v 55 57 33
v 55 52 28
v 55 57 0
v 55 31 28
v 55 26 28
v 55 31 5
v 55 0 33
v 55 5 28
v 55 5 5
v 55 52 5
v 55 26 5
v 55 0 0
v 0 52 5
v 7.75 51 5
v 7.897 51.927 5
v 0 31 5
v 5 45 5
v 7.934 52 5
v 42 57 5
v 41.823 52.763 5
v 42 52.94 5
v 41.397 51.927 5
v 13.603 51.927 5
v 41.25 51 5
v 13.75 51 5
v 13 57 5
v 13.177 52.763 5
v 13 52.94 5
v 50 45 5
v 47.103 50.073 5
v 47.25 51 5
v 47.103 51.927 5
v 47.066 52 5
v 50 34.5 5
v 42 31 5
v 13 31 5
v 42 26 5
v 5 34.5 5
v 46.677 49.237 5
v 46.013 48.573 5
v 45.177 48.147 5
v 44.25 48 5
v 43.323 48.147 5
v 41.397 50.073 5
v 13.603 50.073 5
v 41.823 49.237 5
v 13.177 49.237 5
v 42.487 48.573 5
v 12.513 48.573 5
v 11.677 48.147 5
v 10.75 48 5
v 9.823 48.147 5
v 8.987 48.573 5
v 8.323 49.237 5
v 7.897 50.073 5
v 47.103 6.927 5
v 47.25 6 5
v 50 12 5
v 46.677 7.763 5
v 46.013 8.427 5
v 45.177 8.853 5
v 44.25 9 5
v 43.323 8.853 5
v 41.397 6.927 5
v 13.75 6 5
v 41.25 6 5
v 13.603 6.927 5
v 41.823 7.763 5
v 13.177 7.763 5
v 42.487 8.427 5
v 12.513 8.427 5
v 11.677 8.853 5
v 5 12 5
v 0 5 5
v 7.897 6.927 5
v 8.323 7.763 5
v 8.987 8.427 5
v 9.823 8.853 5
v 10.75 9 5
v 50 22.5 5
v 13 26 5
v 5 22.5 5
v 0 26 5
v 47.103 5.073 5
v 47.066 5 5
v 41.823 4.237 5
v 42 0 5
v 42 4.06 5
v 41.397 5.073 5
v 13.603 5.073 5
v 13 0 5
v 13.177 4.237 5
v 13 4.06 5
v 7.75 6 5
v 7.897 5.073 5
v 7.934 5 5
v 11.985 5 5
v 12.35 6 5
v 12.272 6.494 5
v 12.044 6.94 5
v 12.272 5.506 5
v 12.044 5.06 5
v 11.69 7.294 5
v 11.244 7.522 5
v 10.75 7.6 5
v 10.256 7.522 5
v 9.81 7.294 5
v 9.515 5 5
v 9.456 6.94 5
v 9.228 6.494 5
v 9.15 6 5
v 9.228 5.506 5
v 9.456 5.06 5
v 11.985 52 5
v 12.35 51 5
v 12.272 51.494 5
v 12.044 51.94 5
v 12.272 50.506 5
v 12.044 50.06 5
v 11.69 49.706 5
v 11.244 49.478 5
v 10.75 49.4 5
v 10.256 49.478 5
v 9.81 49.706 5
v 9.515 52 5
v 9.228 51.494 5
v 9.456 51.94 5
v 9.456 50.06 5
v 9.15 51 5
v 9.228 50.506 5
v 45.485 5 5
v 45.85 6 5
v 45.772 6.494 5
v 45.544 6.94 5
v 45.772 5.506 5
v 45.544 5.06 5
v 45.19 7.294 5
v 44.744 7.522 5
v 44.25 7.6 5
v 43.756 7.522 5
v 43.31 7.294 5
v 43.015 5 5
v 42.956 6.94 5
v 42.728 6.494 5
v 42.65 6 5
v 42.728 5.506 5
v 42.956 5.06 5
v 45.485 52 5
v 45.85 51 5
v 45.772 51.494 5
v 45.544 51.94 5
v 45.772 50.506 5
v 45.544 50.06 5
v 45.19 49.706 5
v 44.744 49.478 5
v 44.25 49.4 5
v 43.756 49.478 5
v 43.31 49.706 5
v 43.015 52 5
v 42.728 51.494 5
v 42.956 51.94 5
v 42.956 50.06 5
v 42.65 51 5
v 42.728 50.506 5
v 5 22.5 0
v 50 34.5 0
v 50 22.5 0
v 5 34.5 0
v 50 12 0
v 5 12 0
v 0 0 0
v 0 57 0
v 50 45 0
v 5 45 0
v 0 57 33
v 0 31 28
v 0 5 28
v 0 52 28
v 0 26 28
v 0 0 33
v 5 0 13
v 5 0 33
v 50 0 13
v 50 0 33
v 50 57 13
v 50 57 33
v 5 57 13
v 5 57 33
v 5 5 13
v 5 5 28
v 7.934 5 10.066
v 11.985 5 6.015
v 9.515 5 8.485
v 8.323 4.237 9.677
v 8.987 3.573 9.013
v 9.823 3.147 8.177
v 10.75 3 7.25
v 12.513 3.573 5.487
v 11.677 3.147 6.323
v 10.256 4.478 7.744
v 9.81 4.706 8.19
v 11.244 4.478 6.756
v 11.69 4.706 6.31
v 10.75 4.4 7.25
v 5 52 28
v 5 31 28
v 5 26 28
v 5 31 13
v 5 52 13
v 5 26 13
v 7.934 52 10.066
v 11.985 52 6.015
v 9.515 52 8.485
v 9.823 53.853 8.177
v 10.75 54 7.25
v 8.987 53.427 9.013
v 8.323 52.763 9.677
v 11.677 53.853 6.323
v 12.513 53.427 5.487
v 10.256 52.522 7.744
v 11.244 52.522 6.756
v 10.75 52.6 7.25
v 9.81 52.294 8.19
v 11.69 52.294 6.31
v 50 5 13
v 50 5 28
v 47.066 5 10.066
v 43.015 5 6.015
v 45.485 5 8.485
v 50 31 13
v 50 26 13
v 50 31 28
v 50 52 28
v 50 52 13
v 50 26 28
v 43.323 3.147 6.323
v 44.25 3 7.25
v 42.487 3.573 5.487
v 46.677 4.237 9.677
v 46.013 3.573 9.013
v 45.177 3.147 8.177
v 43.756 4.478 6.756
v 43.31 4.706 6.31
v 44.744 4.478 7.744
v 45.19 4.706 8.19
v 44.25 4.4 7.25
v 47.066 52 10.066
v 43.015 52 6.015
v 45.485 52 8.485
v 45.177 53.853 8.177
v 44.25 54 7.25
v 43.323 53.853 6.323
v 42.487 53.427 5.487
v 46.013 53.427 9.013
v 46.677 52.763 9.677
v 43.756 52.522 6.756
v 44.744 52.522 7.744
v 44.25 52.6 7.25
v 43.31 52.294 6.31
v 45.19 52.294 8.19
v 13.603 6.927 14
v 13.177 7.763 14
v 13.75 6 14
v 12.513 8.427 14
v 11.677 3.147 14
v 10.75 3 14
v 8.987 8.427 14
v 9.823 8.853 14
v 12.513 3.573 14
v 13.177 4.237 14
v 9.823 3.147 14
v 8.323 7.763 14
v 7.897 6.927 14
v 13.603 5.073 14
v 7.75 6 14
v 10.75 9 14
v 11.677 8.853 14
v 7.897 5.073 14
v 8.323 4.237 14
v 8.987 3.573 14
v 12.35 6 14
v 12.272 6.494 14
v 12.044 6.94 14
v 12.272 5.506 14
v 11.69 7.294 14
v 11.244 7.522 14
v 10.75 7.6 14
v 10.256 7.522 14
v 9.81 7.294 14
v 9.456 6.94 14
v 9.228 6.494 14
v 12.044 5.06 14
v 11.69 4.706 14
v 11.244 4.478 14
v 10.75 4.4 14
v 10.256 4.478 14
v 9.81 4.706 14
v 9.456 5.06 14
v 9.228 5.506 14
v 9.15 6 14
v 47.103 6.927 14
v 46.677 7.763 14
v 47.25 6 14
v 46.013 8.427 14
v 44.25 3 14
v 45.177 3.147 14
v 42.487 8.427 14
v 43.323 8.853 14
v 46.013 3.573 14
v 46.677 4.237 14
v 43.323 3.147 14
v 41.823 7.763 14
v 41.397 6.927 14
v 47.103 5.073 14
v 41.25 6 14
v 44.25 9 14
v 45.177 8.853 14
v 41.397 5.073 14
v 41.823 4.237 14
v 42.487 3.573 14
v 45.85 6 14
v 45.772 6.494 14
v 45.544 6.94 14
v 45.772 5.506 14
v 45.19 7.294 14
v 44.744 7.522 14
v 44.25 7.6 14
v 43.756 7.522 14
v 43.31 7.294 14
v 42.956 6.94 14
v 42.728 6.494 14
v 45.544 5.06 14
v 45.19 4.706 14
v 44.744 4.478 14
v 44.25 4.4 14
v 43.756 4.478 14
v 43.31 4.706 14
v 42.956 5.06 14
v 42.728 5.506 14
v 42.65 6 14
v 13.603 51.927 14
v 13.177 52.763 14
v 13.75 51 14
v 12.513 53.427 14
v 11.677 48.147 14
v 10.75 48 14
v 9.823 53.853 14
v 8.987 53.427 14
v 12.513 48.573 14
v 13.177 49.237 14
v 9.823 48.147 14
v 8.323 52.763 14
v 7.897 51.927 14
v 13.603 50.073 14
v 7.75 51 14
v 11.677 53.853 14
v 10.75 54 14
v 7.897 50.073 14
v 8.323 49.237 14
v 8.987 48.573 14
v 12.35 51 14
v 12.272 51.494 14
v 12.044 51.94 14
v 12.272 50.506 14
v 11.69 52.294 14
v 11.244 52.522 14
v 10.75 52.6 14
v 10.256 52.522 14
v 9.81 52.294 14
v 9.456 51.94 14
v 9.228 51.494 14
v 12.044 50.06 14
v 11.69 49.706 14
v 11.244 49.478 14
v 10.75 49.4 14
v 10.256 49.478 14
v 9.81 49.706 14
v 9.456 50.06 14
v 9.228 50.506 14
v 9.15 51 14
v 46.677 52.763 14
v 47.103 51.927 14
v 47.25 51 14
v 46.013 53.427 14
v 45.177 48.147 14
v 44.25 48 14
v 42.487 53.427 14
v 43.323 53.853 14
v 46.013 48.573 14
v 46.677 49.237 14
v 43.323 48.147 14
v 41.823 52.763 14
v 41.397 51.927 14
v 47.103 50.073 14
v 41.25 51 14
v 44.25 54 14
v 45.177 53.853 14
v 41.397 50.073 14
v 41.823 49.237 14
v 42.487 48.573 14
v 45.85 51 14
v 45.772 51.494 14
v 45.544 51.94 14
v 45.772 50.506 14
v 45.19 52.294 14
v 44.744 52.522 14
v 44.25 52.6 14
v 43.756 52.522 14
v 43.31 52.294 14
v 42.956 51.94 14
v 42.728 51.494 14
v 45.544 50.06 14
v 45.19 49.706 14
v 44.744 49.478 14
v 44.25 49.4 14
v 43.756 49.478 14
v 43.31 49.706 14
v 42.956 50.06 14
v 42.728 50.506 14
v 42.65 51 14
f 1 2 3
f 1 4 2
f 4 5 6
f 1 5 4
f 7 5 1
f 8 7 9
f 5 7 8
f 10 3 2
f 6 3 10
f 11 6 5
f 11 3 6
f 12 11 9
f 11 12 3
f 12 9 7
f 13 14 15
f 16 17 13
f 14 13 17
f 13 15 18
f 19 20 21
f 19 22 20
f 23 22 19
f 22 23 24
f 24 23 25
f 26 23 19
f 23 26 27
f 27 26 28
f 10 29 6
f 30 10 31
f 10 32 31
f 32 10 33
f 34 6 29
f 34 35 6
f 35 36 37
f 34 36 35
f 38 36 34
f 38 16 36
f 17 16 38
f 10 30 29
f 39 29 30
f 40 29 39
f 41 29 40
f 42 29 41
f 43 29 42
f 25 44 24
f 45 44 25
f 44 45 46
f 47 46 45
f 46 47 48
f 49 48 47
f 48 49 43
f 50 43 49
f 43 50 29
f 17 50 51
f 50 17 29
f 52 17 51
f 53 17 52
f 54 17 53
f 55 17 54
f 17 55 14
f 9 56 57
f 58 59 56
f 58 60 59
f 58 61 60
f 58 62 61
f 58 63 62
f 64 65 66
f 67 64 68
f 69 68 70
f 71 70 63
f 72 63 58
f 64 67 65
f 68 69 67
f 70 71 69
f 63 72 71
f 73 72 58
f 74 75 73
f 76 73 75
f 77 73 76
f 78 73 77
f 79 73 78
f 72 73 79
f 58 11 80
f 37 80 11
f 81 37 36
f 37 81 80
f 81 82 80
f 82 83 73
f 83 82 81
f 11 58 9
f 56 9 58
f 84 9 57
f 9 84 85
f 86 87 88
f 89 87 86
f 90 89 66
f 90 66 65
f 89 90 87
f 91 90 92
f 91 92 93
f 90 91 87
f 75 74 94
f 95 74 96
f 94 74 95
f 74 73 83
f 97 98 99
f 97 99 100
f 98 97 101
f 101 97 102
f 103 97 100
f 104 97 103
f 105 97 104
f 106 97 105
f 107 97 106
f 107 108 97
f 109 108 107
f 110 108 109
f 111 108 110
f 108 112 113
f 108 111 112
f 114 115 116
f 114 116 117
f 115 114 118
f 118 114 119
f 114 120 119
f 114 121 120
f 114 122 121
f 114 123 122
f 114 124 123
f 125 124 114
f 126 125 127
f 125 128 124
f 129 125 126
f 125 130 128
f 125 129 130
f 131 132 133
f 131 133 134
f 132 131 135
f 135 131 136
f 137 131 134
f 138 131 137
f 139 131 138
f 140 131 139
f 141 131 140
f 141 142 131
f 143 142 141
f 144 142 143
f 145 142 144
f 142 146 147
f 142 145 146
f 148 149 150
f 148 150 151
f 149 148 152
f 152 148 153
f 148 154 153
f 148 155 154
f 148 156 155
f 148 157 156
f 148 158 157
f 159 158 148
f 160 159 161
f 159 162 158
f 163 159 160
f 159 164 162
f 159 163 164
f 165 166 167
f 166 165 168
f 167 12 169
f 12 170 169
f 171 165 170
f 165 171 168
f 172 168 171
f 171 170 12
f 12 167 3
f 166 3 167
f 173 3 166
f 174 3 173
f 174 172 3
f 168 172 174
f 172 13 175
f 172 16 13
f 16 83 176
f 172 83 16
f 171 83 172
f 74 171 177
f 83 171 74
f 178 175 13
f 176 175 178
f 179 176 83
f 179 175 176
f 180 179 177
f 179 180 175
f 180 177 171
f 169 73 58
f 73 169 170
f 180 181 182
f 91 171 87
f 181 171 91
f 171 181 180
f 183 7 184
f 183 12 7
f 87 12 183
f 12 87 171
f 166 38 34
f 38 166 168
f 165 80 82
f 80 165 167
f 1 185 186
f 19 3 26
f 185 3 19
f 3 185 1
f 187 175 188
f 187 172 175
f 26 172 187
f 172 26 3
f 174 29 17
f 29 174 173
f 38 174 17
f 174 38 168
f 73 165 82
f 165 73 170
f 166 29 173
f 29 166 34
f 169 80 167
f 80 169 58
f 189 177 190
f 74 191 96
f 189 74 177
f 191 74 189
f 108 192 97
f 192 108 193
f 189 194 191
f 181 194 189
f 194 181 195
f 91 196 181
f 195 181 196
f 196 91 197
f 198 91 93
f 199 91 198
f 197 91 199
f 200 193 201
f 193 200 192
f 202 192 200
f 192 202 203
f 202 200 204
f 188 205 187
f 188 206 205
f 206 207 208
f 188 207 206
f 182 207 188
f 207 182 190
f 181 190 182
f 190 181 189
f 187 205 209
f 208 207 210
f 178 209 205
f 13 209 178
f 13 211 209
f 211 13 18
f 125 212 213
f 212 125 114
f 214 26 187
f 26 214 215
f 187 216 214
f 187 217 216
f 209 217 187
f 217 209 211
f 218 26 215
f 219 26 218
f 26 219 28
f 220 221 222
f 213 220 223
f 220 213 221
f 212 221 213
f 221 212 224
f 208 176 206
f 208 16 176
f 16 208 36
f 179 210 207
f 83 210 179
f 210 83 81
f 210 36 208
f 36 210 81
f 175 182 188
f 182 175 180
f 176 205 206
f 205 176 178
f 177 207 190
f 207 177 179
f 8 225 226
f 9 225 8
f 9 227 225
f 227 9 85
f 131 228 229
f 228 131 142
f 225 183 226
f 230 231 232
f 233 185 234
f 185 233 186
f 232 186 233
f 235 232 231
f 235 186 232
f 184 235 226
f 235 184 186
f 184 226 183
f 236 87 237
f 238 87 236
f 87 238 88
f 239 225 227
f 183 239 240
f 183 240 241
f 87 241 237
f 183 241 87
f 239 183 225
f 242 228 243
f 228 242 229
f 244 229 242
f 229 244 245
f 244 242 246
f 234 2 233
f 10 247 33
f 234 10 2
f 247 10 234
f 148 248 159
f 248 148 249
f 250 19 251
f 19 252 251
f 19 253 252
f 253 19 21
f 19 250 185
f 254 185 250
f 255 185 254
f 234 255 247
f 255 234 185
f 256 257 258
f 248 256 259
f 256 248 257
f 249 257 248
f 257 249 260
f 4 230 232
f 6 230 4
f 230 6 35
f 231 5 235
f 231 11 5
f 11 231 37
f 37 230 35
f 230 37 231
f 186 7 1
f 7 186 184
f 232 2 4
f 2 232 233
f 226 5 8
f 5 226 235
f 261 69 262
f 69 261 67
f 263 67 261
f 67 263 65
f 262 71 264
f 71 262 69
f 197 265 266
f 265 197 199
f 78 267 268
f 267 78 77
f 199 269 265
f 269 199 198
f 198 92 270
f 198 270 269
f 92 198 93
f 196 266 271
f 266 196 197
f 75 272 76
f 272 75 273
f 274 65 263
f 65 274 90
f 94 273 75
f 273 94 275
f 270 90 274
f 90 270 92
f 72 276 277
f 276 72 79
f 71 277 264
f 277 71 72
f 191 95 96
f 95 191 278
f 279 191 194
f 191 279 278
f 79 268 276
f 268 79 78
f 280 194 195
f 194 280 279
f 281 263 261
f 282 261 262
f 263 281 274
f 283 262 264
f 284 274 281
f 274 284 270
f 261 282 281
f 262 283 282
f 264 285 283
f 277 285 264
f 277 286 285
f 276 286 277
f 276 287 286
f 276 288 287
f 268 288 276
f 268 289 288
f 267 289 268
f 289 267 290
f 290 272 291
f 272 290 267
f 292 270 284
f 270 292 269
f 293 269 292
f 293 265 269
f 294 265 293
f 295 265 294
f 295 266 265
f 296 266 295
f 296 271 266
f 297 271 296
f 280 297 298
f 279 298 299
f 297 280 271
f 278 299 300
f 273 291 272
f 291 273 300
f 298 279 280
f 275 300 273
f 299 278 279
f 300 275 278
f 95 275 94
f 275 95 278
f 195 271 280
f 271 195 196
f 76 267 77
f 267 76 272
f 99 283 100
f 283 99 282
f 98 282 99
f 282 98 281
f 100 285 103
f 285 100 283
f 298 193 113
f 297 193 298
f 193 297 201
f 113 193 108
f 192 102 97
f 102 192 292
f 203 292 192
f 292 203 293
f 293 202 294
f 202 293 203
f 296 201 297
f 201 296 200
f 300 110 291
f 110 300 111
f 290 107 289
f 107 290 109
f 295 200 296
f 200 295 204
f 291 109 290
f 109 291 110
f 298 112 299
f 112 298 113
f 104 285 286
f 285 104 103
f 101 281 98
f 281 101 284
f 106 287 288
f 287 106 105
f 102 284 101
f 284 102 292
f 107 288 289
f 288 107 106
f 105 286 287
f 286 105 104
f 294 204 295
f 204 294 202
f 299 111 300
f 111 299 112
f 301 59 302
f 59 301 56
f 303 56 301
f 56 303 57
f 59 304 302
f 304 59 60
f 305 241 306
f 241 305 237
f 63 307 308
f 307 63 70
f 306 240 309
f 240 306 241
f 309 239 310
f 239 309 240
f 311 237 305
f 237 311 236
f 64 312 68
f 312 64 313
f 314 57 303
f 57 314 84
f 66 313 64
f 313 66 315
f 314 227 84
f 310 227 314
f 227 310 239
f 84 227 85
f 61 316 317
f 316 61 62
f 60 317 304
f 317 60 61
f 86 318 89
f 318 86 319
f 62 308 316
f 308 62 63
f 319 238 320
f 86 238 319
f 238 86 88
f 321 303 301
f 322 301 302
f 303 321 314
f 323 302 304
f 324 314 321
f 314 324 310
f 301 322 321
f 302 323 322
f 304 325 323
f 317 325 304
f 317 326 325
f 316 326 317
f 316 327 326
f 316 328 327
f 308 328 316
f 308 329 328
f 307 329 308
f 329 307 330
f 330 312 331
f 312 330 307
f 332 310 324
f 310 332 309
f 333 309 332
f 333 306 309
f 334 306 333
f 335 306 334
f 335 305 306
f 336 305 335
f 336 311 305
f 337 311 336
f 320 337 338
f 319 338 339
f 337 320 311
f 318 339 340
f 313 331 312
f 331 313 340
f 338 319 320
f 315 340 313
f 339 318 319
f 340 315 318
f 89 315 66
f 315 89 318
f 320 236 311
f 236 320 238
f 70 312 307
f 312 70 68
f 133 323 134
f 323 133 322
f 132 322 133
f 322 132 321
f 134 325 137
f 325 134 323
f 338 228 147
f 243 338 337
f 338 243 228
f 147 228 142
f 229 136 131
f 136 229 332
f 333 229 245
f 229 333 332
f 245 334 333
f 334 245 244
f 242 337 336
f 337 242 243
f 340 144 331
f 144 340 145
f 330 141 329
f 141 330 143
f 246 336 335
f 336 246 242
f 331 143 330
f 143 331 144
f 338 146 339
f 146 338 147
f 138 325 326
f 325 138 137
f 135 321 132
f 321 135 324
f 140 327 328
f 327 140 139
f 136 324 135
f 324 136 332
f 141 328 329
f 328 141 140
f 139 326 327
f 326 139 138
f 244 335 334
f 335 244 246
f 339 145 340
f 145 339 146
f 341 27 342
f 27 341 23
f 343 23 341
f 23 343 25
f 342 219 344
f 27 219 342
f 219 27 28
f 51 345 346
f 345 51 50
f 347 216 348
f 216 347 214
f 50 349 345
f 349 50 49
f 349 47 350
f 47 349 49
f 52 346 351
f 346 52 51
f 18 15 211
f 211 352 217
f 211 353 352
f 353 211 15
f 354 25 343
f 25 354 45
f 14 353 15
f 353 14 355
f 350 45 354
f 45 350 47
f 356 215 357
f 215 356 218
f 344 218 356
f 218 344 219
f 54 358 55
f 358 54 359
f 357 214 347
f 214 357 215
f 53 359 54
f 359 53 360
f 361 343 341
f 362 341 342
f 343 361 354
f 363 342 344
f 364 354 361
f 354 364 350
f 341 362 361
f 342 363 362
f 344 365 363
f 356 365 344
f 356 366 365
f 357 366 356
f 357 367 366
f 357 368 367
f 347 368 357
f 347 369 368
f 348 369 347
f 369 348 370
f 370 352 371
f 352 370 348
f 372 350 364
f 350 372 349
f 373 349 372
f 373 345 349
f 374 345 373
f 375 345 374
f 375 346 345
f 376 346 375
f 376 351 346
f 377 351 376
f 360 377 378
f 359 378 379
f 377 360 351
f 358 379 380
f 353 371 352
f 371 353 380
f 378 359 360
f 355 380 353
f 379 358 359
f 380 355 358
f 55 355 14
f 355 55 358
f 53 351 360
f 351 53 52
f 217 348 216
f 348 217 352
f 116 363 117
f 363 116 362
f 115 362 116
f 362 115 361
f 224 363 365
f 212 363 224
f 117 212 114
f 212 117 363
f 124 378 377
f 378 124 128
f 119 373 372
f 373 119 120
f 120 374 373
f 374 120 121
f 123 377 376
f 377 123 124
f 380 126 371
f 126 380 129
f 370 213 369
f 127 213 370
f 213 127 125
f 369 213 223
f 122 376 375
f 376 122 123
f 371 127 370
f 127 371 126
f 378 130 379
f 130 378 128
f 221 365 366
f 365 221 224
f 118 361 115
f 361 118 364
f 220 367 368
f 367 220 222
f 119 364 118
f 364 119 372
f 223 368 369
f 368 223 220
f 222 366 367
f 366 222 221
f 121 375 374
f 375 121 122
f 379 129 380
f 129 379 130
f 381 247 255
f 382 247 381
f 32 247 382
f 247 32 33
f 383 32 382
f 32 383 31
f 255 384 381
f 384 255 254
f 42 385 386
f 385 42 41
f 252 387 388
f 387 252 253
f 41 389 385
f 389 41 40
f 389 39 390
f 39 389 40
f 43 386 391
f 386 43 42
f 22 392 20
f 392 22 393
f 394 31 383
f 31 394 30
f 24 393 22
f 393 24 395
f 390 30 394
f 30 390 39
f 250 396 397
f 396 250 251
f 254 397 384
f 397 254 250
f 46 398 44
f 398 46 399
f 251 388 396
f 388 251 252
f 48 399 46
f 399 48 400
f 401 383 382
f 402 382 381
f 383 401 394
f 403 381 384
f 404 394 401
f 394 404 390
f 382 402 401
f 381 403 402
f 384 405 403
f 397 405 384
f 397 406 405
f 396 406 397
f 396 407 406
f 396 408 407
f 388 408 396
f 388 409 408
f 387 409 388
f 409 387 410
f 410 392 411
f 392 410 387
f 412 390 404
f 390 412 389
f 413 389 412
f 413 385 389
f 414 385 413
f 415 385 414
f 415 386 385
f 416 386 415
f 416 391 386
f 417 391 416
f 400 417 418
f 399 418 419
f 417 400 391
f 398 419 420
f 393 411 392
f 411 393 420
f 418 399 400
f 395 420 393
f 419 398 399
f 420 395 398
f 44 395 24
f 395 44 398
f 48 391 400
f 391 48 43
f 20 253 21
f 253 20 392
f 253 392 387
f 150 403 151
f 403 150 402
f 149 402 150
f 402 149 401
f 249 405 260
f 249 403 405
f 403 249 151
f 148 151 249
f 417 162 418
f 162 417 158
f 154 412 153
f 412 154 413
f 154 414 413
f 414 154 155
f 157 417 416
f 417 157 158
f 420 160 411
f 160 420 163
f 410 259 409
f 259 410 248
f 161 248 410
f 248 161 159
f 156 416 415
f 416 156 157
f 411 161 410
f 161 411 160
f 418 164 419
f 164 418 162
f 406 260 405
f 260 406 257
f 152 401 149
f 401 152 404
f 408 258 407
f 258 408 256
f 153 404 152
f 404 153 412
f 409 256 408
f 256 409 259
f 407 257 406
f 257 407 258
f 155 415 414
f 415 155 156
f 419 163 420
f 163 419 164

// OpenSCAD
// Neato XV Signature Pro - Inner Left Pod
// Mounts: SunFounder 2-channel Relay Module
// Location: inner left (adjacent to center vent), viewed from behind robot
// One-piece print — flat on bed, no supports needed.
//
// ORIENTATION (as mounted on robot):
//   Bottom face = velcros to robot chassis
//   Walls on long board axis (50.5mm), open on short axis (38.5mm)
//   Both walls half height (~33mm)

// ============================================================
// PARAMETERS
// ============================================================

pod_width  = 55;
pod_depth  = 57;
pod_height = 66;

rail_w = 5;
rib_w  = 12;

wall_h = pod_height * 0.50;  // ~33mm half height

standoff_h    = 9;
standoff_od   = 6;
standoff_hole = 3.2; // M3 for relay

relay_hole_x_span = 33.5;
relay_hole_y_span = 45.0;

relay_x_left  = (pod_width - relay_hole_x_span) / 2;
relay_x_right = relay_x_left + relay_hole_x_span;

relay_y_front = (pod_depth - relay_hole_y_span) / 2;
relay_y_rear  = relay_y_front + relay_hole_y_span;
relay_y_mid   = (relay_y_front + relay_y_rear) / 2;

rib_positions = [relay_y_front, relay_y_mid, relay_y_rear];

relay_holes = [
    [relay_x_left,  relay_y_front],
    [relay_x_right, relay_y_front],
    [relay_x_left,  relay_y_rear ],
    [relay_x_right, relay_y_rear ],
];

// ============================================================
// MODULES
// ============================================================

module ribbed_bottom() {
    cube([rail_w, pod_depth, rail_w]);
    translate([pod_width - rail_w, 0, 0])
        cube([rail_w, pod_depth, rail_w]);
    cube([pod_width, rail_w, rail_w]);
    translate([0, pod_depth - rail_w, 0])
        cube([pod_width, rail_w, rail_w]);
    for (y_center = rib_positions) {
        translate([0, y_center - rib_w / 2, 0])
            cube([pod_width, rib_w, rail_w]);
    }
}

module gusset() {
    rotate([90, 0, 0])
        translate([0, 0, -5])
            linear_extrude(height=5)
                polygon([[0,0], [8,0], [0,8]]);
}

// x_dir: 1 for left wall (gussets extend +X), -1 for right wall (gussets extend -X)
module side_wall(x_pos, x_dir) {
    translate([x_pos, 0, 0]) {
        cube([rail_w, rail_w, wall_h]);
        translate([0, pod_depth - rail_w, 0])
            cube([rail_w, rail_w, wall_h]);
        translate([0, pod_depth / 2 - rail_w / 2, 0])
            cube([rail_w, rail_w, wall_h]);
        translate([0, 0, wall_h - rail_w])
            cube([rail_w, pod_depth, rail_w]);
        // Gussets — direction depends on which wall
        if (x_dir > 0) {
            translate([rail_w, 0, rail_w])             gusset();
            translate([rail_w, pod_depth, rail_w])     mirror([0,1,0]) gusset();
            translate([rail_w, pod_depth/2 - rail_w/2, rail_w]) gusset();
        } else {
            translate([0, 0, rail_w])                  mirror([1,0,0]) gusset();
            translate([0, pod_depth, rail_w])          mirror([1,0,0]) mirror([0,1,0]) gusset();
            translate([0, pod_depth/2 - rail_w/2, rail_w]) mirror([1,0,0]) gusset();
        }
    }
}

module standoff(h, hole_d) {
    difference() {
        cylinder(h=h, d=standoff_od, $fn=20);
        cylinder(h=h + 0.1, d=hole_d, $fn=20);
    }
}

// ============================================================
// MAIN
// ============================================================

module inner_left_pod() {
    union() {
        ribbed_bottom();
        side_wall(0, 1);
        side_wall(pod_width - rail_w, -1);

        for (h = relay_holes) {
            translate([h[0], h[1], rail_w])
                standoff(standoff_h, standoff_hole);
        }
    }
}

inner_left_pod();
